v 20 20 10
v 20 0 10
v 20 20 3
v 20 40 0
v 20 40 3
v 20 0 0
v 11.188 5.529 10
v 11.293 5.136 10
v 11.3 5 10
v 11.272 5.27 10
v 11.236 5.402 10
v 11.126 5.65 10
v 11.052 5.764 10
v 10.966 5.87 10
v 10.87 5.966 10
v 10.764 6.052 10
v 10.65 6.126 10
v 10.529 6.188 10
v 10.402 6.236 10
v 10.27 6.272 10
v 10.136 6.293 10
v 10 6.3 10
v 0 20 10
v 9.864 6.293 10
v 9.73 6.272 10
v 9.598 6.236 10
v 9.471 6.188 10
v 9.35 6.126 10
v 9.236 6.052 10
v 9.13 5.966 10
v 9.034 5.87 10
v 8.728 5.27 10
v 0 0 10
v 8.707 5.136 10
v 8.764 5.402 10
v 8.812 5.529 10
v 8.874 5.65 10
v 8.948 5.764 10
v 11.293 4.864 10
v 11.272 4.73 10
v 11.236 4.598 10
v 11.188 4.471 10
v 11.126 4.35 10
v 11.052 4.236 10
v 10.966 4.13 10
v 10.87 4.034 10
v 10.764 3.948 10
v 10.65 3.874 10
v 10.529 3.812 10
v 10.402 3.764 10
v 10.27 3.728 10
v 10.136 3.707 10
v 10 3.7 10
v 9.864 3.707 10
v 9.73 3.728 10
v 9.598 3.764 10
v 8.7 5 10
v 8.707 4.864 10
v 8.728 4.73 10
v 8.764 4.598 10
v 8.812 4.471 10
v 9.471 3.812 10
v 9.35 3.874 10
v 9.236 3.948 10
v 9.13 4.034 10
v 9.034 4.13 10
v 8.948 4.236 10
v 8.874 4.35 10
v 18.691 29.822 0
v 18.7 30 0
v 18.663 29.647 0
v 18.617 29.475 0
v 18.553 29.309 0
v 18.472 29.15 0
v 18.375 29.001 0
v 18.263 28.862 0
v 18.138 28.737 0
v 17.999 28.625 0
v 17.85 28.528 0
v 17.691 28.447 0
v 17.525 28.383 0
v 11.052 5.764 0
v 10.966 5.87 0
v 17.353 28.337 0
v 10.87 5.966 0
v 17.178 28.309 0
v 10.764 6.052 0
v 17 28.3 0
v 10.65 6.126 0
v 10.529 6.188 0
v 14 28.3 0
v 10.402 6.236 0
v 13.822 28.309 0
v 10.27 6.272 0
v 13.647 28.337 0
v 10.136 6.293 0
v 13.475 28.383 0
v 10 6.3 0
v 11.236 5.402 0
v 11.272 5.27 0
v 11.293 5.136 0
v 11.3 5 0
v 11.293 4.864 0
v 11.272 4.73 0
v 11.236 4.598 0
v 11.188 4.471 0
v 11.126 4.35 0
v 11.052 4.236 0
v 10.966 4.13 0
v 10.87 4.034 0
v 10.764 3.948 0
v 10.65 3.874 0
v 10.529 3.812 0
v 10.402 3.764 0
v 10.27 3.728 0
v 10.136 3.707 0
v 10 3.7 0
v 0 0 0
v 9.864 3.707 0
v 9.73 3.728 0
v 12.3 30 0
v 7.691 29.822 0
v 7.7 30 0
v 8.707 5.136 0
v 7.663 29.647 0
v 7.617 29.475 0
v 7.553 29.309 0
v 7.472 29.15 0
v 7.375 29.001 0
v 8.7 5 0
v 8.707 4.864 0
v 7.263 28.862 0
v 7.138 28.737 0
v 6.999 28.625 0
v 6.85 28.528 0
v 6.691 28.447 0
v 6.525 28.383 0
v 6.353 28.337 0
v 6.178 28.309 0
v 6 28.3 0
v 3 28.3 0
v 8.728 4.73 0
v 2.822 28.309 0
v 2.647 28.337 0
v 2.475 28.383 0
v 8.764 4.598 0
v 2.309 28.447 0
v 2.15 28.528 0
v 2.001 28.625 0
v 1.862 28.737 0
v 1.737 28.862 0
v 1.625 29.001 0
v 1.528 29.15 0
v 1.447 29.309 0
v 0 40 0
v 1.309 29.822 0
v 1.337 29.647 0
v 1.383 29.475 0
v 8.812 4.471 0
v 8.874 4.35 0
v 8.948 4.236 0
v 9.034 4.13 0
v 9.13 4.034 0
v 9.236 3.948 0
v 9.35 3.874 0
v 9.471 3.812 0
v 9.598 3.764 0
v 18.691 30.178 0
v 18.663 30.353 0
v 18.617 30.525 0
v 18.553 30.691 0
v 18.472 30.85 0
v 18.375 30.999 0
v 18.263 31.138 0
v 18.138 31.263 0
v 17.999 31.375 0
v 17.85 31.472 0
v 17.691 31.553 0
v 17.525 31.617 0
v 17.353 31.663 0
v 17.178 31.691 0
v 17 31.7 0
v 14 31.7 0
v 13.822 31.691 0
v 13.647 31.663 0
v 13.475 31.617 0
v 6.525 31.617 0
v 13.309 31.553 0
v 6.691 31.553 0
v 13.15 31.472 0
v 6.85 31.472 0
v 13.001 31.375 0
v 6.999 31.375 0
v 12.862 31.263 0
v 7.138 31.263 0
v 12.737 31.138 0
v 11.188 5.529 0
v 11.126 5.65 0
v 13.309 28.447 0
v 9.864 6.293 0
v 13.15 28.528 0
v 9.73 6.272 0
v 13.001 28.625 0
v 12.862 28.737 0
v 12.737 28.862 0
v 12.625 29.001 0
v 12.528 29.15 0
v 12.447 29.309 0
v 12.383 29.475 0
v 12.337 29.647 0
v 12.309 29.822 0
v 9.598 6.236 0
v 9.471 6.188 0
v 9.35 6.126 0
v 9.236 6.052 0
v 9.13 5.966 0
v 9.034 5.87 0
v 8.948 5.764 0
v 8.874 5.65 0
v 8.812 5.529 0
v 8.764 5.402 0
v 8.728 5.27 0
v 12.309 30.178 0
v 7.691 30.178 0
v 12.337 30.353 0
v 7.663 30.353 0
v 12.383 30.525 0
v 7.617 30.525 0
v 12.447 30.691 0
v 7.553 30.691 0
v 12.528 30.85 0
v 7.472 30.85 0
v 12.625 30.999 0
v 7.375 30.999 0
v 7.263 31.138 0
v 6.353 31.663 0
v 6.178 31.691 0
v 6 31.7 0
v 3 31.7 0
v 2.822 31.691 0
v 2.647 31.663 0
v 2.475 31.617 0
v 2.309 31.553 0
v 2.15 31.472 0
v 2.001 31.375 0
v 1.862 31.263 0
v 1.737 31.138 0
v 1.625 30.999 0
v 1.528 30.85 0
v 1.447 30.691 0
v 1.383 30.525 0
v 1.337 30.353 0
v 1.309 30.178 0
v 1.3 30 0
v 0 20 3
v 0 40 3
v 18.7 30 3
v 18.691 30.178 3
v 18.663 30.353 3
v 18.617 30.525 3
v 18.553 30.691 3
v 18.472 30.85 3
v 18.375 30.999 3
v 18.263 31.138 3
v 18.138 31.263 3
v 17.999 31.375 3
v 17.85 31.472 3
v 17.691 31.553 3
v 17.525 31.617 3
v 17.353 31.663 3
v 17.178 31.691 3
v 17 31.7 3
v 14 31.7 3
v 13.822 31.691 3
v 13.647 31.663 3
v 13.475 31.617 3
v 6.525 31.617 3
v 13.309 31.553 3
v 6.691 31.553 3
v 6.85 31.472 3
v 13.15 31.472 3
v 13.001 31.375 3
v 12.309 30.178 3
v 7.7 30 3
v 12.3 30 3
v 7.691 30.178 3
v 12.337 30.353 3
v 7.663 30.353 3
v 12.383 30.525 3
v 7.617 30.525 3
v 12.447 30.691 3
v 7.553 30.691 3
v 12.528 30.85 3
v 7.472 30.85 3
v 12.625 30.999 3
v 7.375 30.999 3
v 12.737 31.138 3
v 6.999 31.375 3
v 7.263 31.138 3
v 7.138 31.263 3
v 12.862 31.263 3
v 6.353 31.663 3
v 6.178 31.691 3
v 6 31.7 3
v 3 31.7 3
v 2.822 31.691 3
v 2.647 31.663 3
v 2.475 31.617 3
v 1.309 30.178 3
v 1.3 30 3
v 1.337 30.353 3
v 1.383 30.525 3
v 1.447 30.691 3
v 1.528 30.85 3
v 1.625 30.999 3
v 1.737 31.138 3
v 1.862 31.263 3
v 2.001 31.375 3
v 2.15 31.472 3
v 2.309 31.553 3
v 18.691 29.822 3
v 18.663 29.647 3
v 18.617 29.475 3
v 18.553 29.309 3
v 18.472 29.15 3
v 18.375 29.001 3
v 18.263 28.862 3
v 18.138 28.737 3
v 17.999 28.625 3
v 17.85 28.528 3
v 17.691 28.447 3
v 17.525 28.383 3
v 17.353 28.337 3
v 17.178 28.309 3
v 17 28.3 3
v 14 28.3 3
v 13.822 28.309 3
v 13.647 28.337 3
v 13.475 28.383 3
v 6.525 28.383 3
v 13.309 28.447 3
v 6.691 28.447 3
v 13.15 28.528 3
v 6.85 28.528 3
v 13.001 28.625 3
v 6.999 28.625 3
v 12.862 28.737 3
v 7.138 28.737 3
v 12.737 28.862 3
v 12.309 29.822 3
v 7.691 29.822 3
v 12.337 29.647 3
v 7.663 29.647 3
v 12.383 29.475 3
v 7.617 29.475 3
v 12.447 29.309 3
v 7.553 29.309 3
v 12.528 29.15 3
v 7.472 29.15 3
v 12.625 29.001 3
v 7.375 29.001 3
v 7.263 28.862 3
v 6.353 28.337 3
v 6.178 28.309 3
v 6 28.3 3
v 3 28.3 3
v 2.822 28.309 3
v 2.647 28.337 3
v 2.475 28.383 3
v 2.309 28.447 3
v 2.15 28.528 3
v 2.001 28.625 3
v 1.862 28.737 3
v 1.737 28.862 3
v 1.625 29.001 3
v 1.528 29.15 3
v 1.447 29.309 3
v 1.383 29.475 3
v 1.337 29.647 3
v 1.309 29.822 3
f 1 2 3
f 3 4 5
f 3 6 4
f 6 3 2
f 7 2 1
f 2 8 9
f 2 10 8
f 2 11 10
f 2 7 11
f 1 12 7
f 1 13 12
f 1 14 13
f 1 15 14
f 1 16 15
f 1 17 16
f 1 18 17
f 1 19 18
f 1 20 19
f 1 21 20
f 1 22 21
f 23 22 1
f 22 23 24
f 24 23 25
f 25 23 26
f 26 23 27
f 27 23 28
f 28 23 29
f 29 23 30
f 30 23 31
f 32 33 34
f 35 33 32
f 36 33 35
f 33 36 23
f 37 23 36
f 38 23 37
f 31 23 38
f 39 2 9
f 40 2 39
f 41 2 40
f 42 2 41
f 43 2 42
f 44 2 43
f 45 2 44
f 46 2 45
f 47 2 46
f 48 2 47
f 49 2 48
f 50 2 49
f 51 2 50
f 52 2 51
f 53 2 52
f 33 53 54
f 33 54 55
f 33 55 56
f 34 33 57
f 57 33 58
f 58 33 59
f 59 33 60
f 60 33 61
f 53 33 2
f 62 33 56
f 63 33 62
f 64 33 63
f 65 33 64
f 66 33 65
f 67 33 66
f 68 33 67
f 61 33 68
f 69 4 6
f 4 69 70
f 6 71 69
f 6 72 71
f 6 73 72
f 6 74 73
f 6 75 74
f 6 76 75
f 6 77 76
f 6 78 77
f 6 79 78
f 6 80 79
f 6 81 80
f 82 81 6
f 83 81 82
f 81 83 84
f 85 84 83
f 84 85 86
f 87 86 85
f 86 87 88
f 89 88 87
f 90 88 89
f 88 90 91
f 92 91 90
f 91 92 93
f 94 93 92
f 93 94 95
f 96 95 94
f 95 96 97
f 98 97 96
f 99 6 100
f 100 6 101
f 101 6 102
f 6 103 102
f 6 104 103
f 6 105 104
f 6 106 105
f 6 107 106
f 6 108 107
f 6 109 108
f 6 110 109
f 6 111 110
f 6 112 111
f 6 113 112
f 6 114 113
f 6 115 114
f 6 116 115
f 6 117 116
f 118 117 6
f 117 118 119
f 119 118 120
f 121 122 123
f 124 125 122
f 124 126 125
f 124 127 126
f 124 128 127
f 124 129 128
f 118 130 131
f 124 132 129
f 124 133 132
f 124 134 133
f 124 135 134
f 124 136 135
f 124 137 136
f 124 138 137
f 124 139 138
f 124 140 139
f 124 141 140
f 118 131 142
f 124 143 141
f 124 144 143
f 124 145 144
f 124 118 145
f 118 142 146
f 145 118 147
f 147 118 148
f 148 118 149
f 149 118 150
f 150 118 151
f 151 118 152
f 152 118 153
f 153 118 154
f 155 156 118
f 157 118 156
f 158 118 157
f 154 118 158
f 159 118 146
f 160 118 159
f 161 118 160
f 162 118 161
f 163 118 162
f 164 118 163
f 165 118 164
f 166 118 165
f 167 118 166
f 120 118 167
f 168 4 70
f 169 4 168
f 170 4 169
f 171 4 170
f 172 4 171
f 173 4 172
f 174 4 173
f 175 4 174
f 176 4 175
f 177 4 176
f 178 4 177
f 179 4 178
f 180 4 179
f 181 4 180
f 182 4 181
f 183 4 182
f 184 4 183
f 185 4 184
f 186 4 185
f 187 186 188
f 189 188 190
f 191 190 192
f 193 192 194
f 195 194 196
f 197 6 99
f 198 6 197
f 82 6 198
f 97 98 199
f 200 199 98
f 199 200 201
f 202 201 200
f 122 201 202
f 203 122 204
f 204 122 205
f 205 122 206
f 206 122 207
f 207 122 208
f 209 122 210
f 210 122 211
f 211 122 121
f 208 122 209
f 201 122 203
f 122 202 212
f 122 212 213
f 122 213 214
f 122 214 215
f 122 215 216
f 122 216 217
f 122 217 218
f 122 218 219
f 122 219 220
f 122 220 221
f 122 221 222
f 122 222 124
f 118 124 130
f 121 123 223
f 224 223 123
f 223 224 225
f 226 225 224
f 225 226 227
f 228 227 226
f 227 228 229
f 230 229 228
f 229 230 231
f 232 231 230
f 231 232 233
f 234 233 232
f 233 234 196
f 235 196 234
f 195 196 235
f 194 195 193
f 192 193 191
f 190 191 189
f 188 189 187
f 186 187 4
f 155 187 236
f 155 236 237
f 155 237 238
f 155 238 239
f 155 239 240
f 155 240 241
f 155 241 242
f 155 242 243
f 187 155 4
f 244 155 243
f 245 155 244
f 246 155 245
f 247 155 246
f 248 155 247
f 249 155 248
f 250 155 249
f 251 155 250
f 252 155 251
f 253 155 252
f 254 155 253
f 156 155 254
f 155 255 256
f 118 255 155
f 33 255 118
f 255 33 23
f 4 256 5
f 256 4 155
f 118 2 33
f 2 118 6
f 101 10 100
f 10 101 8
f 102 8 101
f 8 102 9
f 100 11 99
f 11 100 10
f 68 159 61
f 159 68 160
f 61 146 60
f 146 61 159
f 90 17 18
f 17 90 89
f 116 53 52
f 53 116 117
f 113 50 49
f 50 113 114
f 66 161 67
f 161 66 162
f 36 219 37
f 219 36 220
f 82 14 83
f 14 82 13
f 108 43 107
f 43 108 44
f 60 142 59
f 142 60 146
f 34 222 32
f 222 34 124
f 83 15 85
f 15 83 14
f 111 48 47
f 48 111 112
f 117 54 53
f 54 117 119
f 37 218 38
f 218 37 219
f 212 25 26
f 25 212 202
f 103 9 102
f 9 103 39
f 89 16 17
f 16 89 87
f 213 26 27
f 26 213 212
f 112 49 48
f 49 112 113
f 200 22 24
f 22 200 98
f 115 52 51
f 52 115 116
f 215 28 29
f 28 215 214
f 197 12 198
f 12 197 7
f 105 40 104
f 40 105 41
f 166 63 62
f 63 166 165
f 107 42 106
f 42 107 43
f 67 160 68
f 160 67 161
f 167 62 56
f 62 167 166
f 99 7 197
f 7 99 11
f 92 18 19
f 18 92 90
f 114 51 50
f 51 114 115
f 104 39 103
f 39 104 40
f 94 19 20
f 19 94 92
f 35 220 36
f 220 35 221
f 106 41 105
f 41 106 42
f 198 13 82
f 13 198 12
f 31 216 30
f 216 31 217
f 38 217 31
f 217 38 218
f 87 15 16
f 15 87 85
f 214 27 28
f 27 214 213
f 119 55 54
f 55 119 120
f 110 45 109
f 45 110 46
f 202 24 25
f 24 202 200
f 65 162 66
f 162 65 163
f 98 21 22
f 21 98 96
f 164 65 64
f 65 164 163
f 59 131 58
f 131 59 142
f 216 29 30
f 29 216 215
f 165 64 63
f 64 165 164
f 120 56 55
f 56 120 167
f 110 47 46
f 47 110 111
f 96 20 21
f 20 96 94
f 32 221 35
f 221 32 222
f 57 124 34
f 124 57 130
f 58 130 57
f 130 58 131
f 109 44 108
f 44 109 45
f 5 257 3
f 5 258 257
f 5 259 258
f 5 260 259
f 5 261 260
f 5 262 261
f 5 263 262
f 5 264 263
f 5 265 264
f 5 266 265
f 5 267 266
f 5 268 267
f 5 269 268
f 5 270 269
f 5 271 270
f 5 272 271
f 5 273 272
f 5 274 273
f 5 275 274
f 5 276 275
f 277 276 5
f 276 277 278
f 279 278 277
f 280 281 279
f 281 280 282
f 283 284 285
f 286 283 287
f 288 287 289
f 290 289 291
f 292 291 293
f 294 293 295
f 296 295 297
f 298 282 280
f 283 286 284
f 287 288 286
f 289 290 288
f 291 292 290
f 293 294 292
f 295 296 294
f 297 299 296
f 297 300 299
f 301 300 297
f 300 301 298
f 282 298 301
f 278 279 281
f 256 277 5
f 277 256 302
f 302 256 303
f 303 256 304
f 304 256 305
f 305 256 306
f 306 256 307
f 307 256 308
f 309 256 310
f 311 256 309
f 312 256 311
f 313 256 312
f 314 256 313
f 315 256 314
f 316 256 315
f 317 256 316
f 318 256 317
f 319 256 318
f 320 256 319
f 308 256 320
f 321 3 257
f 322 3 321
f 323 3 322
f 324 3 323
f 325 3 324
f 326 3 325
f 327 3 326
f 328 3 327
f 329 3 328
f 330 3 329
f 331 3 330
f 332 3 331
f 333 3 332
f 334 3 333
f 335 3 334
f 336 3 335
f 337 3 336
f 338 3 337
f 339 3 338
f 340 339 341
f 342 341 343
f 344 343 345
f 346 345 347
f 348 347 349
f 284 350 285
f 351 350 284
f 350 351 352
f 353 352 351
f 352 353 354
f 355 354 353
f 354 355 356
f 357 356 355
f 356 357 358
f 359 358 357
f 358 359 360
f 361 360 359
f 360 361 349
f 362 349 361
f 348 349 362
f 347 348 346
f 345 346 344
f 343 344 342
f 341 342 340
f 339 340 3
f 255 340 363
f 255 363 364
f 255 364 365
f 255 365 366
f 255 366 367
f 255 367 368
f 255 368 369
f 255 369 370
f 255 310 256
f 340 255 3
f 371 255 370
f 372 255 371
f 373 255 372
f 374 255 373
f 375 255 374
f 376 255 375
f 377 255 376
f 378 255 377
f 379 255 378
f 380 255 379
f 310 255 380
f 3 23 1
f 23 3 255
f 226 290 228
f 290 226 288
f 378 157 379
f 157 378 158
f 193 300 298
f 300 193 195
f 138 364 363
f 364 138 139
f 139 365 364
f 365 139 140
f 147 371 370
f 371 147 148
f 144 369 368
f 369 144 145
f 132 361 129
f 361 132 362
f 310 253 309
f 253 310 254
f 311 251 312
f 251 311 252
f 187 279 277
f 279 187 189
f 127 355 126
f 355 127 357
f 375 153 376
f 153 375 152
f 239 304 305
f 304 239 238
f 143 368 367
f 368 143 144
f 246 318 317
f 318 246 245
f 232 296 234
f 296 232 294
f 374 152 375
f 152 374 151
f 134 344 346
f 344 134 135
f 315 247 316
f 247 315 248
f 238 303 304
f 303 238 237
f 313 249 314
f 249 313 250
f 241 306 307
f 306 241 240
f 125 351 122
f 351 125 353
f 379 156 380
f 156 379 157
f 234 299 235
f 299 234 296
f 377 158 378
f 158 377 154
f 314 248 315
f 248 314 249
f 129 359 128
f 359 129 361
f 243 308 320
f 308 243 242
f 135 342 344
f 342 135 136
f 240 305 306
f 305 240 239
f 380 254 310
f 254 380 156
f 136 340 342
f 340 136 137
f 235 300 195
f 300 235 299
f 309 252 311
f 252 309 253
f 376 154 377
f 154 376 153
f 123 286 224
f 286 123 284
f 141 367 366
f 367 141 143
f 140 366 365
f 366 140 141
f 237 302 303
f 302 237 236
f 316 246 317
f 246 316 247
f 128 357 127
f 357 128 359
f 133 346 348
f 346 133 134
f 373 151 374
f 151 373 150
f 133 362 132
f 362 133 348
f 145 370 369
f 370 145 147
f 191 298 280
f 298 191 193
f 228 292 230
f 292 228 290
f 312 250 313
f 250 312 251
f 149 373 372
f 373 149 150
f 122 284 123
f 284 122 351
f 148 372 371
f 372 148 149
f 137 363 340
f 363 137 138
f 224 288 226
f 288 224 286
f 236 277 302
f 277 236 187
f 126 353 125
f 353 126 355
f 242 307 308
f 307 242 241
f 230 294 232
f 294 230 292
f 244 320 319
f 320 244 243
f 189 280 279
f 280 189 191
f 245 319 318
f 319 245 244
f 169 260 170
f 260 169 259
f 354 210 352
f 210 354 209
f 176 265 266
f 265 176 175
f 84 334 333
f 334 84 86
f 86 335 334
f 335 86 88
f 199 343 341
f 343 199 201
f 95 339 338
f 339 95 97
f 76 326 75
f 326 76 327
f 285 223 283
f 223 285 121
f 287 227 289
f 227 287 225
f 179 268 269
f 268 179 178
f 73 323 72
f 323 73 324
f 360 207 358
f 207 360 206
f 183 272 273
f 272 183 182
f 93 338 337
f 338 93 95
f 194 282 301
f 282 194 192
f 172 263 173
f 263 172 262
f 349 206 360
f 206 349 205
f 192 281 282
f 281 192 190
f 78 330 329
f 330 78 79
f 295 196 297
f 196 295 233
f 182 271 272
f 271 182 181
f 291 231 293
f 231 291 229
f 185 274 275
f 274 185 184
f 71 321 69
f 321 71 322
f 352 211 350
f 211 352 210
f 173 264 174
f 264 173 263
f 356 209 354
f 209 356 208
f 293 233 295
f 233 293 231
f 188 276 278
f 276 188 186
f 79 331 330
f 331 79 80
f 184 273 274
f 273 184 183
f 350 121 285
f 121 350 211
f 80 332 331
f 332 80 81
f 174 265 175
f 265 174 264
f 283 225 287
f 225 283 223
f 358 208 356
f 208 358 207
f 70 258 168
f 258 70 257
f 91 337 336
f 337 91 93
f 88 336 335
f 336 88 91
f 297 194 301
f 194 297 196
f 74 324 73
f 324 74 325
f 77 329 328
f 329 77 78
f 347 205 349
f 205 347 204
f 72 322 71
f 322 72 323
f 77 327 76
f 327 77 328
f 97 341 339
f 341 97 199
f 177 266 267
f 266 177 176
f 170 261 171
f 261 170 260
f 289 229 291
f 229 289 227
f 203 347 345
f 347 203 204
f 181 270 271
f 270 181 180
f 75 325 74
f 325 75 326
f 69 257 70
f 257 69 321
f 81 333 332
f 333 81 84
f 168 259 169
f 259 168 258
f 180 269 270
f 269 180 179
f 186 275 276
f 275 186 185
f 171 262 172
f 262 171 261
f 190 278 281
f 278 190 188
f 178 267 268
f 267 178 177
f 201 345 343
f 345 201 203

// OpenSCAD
$fn = 60;

wallT = 3;
clearance = 0.2;
magnetW = 20;
magnetD = 10;
magnetH = 3;
magnetID = 3;

screwOD = 3;

holderW = magnetW;
holderH = 10;
holderD = 40;


module magnet()  {
    difference() {
        translate([0, 0, magnetH/2]) cube( [magnetW, magnetD, magnetH], center=true );
        translate([0, 0, -1]) cylinder( r=magnetID/2+clearance, h=magnetH+2 );
    }
}

module magnetHolder() {
    difference() {
        // Add - Body
        cube([holderW, holderD, holderH]);
        // Remove - Magnet screw
        translate([holderW/2, magnetD/2, -1])
            cylinder(r=magnetID/2-clearance, h=holderH+2);
        // Remove - Back
        translate([-1, holderD/2, wallT])
            cube([holderW+2, holderD, holderH]);
        // Remove - Holder screws
        translate( [wallT, holderD*3/4, -1])hull(){
            cylinder(r=screwOD/2+clearance, h=holderH+2);
            translate([wallT, 0, 0])
                cylinder(r=screwOD/2+clearance, h=holderH+2);
        }
        translate( [holderW-wallT*2, holderD*3/4, -1])hull(){
            cylinder(r=screwOD/2+clearance, h=holderH+2);
            translate([wallT, 0, 0])
                cylinder(r=screwOD/2+clearance, h=holderH+2);
        }
    }
}

magnetHolder();
